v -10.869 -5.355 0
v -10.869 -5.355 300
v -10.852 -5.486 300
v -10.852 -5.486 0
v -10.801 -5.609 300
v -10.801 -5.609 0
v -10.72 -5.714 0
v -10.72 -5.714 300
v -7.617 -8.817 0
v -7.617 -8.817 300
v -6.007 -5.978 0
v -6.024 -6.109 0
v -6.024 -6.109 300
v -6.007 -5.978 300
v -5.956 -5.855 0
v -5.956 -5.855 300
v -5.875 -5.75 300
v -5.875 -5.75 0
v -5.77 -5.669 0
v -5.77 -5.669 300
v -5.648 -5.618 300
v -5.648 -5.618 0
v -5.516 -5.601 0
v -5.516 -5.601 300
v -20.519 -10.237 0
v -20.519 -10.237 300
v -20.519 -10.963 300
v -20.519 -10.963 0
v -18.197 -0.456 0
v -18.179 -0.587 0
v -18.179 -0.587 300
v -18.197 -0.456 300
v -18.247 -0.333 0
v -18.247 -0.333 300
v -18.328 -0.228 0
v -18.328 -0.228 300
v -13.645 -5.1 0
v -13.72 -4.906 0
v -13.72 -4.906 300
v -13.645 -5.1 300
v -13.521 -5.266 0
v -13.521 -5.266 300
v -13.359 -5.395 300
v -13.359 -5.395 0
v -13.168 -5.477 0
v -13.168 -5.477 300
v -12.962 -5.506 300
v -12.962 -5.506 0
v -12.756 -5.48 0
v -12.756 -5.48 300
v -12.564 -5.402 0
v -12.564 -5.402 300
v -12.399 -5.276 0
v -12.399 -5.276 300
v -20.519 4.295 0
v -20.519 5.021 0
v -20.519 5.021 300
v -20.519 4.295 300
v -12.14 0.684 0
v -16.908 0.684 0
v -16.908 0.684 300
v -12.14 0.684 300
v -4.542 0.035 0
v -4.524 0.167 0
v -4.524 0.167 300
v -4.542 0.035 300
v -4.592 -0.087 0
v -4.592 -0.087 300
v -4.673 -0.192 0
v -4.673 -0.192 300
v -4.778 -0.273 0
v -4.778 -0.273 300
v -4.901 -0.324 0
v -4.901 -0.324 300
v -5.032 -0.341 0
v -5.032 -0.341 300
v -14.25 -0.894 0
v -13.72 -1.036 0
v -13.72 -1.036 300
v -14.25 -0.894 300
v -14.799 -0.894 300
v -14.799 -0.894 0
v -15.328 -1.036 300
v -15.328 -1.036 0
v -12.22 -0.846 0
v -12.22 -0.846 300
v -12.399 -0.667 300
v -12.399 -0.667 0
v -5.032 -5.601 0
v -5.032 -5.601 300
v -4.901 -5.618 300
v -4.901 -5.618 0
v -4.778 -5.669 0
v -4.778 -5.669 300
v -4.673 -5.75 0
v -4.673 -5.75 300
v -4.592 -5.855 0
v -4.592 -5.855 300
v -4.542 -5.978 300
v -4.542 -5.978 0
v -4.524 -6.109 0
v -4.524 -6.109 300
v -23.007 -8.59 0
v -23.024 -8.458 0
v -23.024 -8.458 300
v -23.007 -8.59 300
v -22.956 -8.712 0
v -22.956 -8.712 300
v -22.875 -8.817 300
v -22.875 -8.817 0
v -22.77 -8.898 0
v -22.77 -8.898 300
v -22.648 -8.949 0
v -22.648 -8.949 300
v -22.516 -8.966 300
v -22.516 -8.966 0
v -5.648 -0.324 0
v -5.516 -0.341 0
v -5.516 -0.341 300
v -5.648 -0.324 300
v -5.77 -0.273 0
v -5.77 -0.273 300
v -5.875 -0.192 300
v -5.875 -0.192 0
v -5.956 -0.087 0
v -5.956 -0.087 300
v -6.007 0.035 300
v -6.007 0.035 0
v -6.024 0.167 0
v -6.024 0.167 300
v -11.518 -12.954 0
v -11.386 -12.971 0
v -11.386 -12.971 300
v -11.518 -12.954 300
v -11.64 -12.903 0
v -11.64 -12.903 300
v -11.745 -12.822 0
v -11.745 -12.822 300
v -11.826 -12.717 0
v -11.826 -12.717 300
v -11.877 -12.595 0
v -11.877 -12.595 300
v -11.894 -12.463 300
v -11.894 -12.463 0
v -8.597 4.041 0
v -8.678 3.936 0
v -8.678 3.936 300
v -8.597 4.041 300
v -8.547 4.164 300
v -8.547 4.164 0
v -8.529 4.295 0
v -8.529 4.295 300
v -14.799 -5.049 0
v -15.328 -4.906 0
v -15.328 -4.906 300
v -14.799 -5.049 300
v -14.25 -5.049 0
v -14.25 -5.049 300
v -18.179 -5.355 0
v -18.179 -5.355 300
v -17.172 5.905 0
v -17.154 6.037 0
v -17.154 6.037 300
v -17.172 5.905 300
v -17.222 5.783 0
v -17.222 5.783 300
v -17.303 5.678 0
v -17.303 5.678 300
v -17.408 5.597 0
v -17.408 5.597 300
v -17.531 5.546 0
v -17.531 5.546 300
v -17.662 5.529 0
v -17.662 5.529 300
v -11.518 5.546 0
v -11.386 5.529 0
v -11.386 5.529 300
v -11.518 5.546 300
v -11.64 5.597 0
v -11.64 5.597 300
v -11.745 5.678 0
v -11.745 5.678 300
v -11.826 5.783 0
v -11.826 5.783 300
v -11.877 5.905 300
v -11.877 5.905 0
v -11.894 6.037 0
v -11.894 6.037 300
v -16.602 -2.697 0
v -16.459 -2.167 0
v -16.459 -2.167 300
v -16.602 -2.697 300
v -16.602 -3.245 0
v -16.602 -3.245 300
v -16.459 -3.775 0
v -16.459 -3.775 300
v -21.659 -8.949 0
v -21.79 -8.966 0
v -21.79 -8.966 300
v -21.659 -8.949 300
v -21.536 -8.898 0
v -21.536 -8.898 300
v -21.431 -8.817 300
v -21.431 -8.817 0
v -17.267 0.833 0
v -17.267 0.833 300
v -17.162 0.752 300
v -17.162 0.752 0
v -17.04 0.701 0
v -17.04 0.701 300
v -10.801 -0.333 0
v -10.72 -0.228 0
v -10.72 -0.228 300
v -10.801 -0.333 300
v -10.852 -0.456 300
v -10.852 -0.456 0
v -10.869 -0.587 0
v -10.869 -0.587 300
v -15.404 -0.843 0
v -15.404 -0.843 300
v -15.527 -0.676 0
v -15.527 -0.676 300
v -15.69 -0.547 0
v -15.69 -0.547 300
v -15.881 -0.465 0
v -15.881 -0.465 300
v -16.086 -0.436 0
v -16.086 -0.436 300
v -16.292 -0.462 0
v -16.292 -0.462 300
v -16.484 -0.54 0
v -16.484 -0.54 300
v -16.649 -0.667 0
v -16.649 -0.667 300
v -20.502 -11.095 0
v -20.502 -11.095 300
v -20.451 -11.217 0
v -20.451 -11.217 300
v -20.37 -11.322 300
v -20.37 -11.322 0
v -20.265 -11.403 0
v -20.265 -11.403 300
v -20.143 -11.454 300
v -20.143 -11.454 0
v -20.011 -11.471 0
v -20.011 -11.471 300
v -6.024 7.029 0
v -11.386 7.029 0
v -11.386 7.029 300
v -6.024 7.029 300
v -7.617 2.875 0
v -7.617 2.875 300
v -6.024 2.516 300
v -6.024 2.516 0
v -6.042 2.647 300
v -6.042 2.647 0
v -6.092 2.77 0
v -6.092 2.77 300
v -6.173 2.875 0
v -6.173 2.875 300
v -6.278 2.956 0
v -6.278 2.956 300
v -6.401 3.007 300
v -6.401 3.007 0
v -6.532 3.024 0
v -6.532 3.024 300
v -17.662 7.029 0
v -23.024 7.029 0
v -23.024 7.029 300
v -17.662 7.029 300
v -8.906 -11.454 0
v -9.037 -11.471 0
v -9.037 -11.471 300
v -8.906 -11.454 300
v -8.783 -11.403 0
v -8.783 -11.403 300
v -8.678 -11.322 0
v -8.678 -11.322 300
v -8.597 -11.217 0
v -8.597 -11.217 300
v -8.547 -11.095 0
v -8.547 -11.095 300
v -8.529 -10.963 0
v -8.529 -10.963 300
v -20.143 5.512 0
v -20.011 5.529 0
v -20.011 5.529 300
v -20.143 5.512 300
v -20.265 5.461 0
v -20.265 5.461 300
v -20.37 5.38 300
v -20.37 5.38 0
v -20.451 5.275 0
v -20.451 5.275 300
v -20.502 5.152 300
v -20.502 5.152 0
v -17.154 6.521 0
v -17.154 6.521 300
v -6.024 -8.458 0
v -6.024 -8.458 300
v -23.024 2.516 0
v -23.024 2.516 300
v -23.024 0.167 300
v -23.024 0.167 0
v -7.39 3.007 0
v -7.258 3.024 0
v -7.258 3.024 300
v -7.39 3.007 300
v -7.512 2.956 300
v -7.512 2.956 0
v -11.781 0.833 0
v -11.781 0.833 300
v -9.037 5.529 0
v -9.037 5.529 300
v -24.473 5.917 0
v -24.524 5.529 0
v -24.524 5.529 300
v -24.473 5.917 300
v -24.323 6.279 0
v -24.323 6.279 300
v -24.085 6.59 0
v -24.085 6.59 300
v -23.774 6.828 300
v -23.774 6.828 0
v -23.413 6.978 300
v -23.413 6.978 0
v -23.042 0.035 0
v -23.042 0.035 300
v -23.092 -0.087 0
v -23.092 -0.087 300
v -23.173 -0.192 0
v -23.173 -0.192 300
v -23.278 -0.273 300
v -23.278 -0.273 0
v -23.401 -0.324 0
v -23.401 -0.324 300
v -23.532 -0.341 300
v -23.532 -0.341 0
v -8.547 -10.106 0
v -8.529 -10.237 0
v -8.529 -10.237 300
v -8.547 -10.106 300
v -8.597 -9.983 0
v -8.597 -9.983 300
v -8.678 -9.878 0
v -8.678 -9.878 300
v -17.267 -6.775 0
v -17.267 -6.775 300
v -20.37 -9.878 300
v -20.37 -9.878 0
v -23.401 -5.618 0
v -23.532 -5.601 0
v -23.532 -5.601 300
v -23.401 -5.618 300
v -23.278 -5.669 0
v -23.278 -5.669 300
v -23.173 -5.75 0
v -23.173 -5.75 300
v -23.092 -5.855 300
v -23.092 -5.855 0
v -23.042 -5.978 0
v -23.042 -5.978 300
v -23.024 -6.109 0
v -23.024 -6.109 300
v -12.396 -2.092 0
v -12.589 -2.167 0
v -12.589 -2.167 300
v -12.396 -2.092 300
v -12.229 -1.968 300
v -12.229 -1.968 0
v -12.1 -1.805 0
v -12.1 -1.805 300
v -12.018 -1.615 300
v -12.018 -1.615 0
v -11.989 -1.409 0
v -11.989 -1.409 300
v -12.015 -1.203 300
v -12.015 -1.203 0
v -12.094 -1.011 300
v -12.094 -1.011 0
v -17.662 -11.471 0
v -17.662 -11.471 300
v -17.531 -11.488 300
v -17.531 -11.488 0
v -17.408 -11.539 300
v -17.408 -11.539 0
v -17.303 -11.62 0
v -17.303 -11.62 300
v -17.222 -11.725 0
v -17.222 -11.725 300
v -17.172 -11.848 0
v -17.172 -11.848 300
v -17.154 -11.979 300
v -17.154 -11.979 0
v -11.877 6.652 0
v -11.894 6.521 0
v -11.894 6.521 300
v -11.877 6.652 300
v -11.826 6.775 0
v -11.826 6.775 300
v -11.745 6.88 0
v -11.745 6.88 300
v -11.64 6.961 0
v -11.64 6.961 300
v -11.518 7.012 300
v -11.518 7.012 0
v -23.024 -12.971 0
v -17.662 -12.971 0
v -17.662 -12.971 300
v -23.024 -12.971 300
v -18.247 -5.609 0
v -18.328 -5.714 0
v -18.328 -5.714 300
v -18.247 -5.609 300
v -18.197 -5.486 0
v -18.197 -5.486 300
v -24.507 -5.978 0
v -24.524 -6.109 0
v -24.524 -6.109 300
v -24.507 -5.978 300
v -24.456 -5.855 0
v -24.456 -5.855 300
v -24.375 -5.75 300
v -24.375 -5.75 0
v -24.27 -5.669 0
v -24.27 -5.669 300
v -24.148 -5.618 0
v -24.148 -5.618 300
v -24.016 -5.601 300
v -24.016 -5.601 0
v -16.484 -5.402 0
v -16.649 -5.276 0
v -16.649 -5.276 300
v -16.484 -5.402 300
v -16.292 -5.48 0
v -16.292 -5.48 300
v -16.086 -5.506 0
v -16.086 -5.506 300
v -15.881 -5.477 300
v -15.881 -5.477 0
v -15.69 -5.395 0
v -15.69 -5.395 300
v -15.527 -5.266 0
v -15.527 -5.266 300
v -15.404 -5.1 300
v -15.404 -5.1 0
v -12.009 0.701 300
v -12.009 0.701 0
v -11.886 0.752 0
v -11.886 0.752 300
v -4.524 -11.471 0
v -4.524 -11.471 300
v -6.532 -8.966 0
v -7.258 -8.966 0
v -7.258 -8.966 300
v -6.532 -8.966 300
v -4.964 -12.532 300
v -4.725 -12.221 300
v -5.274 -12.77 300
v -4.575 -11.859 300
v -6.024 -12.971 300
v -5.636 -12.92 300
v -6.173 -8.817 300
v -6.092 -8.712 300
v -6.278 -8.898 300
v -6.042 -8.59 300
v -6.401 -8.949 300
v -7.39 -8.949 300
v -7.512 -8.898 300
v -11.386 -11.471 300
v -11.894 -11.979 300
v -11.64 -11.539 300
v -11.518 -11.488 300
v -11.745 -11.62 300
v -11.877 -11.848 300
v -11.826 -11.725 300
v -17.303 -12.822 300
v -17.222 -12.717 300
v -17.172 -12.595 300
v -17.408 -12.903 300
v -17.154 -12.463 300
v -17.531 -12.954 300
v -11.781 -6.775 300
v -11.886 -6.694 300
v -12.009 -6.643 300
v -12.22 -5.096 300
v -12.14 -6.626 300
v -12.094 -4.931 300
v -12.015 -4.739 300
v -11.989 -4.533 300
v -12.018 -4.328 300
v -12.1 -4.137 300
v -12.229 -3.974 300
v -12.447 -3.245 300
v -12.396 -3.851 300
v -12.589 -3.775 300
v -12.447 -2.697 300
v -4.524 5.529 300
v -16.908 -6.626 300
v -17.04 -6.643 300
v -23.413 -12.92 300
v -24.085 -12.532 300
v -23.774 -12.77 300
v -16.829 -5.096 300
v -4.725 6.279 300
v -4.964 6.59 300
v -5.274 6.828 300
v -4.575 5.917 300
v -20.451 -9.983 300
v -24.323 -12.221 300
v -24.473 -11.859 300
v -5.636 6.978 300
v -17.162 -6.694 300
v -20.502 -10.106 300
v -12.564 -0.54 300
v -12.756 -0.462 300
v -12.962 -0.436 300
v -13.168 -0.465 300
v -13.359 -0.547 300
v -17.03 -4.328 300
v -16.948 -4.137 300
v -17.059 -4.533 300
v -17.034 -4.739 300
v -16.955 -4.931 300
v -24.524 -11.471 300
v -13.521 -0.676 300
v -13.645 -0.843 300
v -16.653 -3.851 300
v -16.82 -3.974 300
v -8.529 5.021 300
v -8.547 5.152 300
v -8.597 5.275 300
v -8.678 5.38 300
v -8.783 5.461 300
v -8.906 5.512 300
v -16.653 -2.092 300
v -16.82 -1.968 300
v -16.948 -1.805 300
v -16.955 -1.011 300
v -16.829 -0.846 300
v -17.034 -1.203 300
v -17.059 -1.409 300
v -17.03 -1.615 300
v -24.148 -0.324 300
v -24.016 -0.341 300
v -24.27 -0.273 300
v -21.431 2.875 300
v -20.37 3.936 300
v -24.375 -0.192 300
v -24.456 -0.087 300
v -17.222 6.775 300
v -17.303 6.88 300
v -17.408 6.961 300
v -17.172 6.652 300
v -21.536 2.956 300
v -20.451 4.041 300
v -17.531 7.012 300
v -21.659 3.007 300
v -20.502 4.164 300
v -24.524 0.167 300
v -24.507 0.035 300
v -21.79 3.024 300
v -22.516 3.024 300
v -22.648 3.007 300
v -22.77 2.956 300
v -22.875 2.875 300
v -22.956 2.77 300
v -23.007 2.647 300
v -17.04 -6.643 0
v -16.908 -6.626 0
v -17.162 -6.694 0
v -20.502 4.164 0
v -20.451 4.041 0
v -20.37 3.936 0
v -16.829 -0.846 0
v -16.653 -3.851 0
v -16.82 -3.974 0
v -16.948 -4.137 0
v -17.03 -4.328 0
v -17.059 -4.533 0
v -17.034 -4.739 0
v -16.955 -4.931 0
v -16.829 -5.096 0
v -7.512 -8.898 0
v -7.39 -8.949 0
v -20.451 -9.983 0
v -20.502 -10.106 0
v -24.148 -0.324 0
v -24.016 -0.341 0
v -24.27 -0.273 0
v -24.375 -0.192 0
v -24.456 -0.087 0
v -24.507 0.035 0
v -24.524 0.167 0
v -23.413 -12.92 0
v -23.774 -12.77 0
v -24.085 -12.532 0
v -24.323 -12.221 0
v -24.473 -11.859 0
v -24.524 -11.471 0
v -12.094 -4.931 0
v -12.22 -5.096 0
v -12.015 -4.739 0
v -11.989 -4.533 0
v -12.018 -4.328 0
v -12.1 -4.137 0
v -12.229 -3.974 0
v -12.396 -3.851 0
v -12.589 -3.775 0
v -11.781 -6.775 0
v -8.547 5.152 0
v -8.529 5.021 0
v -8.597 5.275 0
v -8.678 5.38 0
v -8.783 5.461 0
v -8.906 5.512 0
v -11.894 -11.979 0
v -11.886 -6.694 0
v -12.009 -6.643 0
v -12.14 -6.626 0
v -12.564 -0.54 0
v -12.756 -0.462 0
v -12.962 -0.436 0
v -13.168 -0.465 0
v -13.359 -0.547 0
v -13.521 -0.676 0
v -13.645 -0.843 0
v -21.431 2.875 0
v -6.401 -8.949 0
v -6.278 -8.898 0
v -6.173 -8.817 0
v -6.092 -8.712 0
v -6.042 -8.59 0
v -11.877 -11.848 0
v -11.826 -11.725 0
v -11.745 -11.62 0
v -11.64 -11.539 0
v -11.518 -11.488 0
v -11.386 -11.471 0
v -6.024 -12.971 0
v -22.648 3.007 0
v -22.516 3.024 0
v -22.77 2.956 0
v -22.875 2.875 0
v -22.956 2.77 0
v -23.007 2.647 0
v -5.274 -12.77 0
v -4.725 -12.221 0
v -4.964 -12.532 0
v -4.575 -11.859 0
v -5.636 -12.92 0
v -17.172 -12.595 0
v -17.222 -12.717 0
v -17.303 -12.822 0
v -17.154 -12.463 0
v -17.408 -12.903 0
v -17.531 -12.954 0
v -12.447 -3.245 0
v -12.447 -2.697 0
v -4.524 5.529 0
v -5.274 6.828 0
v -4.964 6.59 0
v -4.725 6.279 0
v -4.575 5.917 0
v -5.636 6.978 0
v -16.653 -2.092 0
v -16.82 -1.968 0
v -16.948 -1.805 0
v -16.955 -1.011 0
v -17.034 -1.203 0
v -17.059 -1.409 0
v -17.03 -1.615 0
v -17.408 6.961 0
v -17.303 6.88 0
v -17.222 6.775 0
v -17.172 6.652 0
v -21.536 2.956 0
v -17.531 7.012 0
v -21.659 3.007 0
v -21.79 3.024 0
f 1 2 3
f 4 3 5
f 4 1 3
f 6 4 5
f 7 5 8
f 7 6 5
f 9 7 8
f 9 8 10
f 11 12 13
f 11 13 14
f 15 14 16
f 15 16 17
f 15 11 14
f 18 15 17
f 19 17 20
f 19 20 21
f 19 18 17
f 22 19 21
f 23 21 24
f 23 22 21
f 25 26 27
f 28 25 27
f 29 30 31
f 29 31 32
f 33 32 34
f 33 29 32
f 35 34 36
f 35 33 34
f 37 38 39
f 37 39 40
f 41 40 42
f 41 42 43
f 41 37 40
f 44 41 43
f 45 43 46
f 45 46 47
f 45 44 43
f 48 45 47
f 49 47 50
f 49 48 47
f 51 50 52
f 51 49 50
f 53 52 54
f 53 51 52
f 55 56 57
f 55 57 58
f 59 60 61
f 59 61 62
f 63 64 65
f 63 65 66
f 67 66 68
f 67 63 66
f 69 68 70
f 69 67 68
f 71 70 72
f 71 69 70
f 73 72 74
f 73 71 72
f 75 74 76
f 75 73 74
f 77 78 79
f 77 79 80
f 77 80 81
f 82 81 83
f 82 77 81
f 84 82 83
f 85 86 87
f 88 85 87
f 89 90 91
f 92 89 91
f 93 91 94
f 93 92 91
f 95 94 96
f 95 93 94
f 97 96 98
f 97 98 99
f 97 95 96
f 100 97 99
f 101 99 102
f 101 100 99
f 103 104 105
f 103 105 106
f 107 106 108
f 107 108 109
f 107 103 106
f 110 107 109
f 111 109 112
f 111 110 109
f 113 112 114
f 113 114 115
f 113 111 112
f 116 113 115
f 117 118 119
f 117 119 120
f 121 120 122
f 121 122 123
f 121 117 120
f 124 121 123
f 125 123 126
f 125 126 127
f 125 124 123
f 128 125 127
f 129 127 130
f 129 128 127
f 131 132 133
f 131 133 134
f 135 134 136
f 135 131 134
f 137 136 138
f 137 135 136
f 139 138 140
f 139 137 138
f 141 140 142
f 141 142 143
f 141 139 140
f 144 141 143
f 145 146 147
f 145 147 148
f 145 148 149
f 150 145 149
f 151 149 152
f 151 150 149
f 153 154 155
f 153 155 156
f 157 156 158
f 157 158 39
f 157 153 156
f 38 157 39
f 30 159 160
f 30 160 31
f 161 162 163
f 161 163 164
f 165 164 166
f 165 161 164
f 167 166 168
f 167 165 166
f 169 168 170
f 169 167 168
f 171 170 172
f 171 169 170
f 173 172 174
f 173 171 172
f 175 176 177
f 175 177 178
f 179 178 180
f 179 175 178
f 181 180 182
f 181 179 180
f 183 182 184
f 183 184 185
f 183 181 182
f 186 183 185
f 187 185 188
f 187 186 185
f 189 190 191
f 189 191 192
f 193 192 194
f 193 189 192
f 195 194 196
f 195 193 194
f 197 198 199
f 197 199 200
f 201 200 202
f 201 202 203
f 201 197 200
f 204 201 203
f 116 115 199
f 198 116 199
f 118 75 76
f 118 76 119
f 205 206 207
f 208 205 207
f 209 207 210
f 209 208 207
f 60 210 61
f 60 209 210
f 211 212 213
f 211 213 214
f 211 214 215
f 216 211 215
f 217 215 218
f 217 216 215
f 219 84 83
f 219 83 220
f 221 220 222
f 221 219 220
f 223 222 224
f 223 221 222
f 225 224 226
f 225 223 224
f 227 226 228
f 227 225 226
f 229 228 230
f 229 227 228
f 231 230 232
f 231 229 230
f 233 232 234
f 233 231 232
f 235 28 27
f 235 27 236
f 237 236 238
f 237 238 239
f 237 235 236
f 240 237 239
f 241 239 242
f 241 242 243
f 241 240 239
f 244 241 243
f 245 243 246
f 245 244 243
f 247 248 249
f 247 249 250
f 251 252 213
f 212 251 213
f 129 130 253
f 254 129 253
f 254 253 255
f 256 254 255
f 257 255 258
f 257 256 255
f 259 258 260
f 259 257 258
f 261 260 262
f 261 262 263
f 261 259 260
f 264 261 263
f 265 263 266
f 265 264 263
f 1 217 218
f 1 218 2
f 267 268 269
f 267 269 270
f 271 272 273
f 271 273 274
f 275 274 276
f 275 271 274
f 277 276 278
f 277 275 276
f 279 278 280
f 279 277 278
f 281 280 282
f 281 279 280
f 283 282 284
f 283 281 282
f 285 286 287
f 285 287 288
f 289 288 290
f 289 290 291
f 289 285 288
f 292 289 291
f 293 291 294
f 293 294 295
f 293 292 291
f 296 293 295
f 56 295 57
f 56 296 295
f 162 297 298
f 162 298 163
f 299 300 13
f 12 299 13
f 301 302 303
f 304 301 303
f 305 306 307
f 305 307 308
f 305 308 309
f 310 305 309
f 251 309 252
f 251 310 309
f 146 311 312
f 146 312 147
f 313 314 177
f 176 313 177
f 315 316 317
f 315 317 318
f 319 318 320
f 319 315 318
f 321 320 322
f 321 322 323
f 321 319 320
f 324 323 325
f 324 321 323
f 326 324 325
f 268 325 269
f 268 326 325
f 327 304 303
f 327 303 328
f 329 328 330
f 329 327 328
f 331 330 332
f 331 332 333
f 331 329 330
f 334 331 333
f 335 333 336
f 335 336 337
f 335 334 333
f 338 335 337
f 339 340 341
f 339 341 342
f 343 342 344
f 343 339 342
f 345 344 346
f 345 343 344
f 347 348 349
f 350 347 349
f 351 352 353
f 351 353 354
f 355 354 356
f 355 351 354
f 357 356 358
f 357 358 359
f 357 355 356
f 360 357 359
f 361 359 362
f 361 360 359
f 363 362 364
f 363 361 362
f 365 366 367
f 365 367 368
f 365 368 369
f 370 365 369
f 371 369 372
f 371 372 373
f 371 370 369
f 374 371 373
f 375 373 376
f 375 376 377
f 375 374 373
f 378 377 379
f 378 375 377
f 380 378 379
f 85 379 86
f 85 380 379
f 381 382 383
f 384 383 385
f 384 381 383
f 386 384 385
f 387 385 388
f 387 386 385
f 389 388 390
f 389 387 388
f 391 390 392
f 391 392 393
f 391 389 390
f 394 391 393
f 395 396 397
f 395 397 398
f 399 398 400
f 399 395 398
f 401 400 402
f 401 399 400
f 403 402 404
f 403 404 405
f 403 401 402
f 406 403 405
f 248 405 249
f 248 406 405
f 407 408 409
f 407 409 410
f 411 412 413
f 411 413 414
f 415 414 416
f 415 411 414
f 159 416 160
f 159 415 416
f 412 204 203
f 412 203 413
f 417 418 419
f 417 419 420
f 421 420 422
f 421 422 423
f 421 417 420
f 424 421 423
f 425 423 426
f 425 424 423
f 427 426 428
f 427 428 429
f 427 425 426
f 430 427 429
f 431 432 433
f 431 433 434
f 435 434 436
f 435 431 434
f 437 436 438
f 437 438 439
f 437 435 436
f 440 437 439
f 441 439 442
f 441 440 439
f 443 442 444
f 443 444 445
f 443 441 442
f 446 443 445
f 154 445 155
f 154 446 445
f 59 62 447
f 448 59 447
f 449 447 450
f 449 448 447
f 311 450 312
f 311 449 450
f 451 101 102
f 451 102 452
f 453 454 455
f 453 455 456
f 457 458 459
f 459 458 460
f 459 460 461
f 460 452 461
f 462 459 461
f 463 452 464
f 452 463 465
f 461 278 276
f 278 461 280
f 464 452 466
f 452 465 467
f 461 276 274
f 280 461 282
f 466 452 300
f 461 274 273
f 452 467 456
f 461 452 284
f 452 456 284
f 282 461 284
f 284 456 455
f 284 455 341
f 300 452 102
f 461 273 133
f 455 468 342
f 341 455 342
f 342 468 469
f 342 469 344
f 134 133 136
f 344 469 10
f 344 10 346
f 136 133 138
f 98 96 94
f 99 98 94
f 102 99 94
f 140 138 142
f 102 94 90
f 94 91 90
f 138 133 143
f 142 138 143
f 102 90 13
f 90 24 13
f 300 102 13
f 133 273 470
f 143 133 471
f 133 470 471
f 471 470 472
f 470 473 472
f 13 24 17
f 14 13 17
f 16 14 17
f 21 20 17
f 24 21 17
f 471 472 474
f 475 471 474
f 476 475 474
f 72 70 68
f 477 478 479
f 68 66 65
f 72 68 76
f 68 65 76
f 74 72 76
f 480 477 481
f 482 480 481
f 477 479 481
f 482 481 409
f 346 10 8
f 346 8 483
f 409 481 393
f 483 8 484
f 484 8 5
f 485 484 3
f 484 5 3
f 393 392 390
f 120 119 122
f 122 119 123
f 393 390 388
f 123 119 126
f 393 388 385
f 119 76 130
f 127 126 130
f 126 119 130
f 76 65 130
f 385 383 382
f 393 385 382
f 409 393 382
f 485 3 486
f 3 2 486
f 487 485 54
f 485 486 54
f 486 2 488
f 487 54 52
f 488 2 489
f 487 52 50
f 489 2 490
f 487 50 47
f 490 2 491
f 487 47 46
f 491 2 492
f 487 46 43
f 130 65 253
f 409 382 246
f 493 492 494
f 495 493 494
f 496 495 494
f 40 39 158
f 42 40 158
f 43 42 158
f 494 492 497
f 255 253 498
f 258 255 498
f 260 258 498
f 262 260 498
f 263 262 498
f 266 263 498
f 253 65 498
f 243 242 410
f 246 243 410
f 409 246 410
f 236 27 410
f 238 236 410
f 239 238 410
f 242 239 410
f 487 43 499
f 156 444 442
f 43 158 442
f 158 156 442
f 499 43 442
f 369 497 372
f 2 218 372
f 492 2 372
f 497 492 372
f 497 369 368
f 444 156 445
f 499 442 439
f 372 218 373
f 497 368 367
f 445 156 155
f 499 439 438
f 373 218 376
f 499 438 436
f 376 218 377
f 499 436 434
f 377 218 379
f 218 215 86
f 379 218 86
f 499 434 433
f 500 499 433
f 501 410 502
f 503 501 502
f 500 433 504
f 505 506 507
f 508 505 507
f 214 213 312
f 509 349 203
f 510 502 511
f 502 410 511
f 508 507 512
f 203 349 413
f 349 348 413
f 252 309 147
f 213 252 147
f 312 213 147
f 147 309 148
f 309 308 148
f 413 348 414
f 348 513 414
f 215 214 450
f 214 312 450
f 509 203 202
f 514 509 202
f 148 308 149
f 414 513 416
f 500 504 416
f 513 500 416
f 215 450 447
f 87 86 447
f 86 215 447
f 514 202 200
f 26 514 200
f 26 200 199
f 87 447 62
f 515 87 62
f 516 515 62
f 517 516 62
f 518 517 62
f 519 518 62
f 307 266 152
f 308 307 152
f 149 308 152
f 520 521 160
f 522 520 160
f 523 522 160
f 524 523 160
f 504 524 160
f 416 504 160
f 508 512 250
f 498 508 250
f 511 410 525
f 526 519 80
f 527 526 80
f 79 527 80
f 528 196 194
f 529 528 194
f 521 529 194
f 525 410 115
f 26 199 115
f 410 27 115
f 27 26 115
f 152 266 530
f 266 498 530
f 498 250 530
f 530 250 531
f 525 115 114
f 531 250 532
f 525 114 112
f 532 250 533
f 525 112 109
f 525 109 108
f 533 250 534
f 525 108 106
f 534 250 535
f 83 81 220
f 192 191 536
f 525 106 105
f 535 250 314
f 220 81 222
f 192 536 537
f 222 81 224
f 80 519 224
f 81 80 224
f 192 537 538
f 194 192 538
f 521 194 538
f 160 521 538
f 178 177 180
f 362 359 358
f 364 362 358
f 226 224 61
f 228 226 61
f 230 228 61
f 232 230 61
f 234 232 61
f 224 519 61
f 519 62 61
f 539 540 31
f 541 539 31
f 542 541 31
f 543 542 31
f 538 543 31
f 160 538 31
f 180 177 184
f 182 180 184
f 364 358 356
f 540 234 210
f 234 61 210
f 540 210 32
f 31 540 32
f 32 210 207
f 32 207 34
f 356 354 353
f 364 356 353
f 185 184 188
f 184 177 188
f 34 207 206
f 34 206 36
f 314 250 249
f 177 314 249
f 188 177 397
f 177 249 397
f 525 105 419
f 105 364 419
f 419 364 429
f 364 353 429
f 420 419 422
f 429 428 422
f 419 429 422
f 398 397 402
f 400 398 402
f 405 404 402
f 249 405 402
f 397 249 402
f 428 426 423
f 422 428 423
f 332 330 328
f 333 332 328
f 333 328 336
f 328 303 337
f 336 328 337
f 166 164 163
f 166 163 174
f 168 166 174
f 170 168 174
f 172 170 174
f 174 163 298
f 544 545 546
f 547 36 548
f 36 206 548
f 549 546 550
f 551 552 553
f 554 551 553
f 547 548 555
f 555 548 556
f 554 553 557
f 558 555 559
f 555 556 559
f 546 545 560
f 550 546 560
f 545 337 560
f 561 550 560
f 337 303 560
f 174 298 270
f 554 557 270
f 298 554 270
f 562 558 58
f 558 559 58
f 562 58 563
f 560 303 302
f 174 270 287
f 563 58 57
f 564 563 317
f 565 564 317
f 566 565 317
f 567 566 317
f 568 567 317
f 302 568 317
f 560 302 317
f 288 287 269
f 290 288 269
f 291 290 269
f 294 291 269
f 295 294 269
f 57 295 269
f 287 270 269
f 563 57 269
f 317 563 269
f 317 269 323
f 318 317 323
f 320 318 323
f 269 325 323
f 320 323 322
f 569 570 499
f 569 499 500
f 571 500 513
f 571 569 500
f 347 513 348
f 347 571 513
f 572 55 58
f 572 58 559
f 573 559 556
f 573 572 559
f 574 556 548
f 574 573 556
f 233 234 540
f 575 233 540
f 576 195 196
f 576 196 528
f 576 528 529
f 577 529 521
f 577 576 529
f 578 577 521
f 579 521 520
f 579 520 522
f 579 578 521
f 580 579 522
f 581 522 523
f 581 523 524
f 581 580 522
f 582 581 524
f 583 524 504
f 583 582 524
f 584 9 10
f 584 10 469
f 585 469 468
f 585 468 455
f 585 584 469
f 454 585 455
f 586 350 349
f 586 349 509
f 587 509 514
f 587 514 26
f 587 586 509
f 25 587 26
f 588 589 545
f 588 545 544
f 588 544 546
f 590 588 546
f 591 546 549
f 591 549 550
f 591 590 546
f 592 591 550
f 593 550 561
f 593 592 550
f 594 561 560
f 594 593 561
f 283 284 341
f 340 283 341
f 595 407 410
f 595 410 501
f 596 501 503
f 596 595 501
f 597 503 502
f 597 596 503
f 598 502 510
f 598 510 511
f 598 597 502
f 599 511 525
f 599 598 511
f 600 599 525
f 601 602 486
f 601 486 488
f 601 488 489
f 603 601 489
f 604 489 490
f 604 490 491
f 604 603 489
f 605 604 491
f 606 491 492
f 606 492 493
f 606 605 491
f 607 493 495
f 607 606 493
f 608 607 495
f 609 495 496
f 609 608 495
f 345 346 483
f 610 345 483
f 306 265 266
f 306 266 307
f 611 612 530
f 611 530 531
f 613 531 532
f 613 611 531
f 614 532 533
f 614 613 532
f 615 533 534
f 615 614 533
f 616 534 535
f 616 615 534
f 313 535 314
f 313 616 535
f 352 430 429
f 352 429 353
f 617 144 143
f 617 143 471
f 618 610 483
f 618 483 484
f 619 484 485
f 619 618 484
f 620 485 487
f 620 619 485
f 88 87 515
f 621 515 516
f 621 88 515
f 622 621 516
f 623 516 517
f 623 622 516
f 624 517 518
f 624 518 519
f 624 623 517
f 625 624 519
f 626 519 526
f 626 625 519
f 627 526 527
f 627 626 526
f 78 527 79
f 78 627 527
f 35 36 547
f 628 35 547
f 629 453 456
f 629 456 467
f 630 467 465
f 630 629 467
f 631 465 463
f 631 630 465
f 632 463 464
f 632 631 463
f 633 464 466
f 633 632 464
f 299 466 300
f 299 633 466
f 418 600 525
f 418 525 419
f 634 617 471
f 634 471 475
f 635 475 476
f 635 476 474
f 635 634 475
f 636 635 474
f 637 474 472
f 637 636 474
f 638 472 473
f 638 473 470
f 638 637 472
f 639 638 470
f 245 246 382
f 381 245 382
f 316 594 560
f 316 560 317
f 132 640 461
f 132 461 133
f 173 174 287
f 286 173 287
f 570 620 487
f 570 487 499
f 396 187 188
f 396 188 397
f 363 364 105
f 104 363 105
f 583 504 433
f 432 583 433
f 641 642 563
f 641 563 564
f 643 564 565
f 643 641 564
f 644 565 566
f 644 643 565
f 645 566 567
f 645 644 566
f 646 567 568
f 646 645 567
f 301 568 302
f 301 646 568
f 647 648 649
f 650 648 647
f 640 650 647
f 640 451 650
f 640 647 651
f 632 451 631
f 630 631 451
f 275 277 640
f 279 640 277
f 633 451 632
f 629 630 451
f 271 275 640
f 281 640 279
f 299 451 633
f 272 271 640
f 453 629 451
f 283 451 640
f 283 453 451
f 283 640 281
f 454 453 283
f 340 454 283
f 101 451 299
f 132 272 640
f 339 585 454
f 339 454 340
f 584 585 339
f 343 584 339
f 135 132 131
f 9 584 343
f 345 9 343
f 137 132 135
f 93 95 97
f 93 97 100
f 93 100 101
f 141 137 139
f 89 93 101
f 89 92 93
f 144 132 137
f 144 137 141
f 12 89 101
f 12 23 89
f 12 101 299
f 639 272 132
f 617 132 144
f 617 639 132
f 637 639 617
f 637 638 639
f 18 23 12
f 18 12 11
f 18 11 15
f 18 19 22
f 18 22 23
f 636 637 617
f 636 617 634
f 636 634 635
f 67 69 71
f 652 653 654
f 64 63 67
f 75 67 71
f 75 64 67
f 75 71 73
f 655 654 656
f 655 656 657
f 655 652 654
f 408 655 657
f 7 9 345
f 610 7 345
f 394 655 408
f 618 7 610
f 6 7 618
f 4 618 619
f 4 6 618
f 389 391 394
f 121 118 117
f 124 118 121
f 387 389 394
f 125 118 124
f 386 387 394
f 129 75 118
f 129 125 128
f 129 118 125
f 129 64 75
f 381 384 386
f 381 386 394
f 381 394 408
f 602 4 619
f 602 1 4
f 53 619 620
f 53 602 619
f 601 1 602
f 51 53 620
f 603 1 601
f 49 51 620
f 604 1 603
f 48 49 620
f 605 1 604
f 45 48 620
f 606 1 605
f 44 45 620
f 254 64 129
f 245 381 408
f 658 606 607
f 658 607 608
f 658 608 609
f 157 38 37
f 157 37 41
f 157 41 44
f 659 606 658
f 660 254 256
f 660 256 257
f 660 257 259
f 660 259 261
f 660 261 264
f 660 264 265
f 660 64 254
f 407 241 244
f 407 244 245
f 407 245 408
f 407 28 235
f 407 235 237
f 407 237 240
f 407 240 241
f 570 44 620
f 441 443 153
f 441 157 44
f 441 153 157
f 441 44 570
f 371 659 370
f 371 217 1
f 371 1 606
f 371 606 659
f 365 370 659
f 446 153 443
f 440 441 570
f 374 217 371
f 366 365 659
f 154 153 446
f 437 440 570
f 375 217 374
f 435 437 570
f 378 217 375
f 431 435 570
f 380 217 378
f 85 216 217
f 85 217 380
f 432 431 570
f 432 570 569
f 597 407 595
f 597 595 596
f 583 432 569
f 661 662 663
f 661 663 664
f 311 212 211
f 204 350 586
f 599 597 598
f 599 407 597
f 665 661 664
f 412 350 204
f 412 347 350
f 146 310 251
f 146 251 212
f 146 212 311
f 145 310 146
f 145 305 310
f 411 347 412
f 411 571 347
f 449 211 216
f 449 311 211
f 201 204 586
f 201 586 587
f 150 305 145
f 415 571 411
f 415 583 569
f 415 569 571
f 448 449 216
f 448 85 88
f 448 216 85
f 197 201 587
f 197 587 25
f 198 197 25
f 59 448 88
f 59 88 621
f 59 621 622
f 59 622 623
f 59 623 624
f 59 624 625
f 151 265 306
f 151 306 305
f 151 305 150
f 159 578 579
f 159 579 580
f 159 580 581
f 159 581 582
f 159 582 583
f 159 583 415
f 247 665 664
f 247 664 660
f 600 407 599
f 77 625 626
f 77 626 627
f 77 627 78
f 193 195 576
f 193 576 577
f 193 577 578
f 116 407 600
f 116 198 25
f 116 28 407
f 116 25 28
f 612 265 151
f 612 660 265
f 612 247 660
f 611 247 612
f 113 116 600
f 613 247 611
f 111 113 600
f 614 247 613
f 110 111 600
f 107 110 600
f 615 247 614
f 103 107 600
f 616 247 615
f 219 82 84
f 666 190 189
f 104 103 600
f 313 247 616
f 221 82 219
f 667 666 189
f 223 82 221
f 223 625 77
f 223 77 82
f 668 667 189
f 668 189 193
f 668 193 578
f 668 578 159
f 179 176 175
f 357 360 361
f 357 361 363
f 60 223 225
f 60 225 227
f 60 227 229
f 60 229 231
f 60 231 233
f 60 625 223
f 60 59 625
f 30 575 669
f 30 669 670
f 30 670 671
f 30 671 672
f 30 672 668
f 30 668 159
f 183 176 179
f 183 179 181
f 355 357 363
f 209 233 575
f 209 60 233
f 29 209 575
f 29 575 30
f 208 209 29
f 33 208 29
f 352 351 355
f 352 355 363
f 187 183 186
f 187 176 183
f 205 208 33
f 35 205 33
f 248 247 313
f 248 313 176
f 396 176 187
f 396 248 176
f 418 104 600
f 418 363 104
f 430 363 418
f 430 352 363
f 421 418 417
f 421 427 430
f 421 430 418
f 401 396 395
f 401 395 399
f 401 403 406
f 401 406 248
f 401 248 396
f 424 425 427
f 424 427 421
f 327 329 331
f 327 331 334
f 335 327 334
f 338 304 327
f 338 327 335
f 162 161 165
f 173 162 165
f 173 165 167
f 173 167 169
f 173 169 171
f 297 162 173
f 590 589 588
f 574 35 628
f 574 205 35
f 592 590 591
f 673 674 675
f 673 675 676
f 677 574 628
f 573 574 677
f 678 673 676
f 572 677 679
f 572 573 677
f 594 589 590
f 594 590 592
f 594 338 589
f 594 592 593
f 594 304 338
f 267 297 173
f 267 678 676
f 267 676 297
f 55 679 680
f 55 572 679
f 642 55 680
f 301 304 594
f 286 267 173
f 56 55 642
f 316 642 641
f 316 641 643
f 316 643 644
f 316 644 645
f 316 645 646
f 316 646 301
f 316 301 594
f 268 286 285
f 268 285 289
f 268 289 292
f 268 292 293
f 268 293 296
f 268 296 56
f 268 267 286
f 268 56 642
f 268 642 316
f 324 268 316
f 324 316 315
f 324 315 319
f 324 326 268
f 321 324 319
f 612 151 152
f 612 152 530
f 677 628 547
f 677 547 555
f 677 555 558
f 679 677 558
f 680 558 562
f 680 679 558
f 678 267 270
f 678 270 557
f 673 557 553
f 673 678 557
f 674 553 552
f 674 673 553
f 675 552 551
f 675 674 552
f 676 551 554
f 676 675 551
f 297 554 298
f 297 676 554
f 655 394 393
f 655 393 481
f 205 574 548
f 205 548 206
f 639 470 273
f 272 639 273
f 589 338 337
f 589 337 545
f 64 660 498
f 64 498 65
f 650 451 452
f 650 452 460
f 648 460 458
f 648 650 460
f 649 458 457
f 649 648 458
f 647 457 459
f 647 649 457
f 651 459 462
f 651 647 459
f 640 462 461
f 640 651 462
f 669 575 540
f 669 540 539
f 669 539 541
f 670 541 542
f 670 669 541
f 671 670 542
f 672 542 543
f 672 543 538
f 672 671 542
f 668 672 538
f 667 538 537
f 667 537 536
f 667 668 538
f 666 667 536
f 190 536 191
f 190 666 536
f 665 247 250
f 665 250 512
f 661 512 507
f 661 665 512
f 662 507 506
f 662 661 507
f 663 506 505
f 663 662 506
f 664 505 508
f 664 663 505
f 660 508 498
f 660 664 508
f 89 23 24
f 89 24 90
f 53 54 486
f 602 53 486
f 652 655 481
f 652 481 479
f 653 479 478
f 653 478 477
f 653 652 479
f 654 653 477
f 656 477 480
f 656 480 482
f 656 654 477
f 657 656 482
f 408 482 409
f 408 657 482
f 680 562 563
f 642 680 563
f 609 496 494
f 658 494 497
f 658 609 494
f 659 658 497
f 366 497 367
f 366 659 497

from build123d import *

# Parameters (mm, degrees)
EXTRUDE1_DEPTH = 300


with BuildPart() as part:
    # Sketch1 → Extrude1 (new body)
    with BuildSketch(Plane.XY):
        with BuildLine():
            Line((-5.032287798, -0.341059771), (-5.516287798, -0.341059771))
            ThreePointArc((-5.516287798, -0.341059771), (-5.875498042, -0.192270016), (-6.024287798, 0.166940229))
            Line((-6.024287798, 0.166940229), (-6.024287798, 2.515940229))
            ThreePointArc((-6.024287798, 2.515940229), (-6.173077553, 2.875150474), (-6.532287798, 3.023940229))
            Line((-6.532287798, 3.023940229), (-7.258207136, 3.023940229))
            ThreePointArc((-7.258207136, 3.023940229), (-7.45261032, 2.985271032), (-7.617417381, 2.875150474))
            Line((-7.617417381, 2.875150474), (-10.720498042, -0.227930187))
            ThreePointArc((-10.720498042, -0.227930187), (-10.8306186, -0.392737249), (-10.869287798, -0.587140432))
            Line((-10.869287798, -0.587140432), (-10.869287798, -5.354979109))
            ThreePointArc((-10.869287798, -5.354979109), (-10.8306186, -5.549382293), (-10.720498042, -5.714189354))
            Line((-10.720498042, -5.714189354), (-7.617417381, -8.817270016))
            ThreePointArc((-7.617417381, -8.817270016), (-7.45261032, -8.927390573), (-7.258207136, -8.966059771))
            Line((-7.258207136, -8.966059771), (-6.532287798, -8.966059771))
            ThreePointArc((-6.532287798, -8.966059771), (-6.173077553, -8.817270016), (-6.024287798, -8.458059771))
            Line((-6.024287798, -8.458059771), (-6.024287798, -6.109059771))
            ThreePointArc((-6.024287798, -6.109059771), (-5.875498042, -5.749849526), (-5.516287798, -5.601059771))
            Line((-5.516287798, -5.601059771), (-5.032287798, -5.601059771))
            ThreePointArc((-5.032287798, -5.601059771), (-4.673077553, -5.749849526), (-4.524287798, -6.109059771))
            Line((-4.524287798, -6.109059771), (-4.524287798, -11.471059771))
            ThreePointArc((-4.524287798, -11.471059771), (-4.963627626, -12.531719943), (-6.024287798, -12.971059771))
            Line((-6.024287798, -12.971059771), (-11.386287798, -12.971059771))
            ThreePointArc((-11.386287798, -12.971059771), (-11.745498042, -12.822270016), (-11.894287798, -12.463059771))
            Line((-11.894287798, -12.463059771), (-11.894287798, -11.979059771))
            ThreePointArc((-11.894287798, -11.979059771), (-11.745498042, -11.619849526), (-11.386287798, -11.471059771))
            Line((-11.386287798, -11.471059771), (-9.037287798, -11.471059771))
            ThreePointArc((-9.037287798, -11.471059771), (-8.678077553, -11.322270016), (-8.529287798, -10.963059771))
            Line((-8.529287798, -10.963059771), (-8.529287798, -10.237140432))
            ThreePointArc((-8.529287798, -10.237140432), (-8.567956995, -10.042737249), (-8.678077553, -9.877930187))
            Line((-8.678077553, -9.877930187), (-11.781158214, -6.774849526))
            ThreePointArc((-11.781158214, -6.774849526), (-11.945965275, -6.664728968), (-12.140368459, -6.626059771))
            Line((-12.140368459, -6.626059771), (-16.908207136, -6.626059771))
            ThreePointArc((-16.908207136, -6.626059771), (-17.10261032, -6.664728968), (-17.267417381, -6.774849526))
            Line((-17.267417381, -6.774849526), (-20.370498042, -9.877930187))
            ThreePointArc((-20.370498042, -9.877930187), (-20.4806186, -10.042737249), (-20.519287798, -10.237140432))
            Line((-20.519287798, -10.237140432), (-20.519287798, -10.963059771))
            ThreePointArc((-20.519287798, -10.963059771), (-20.370498042, -11.322270016), (-20.011287798, -11.471059771))
            Line((-20.011287798, -11.471059771), (-17.662287798, -11.471059771))
            ThreePointArc((-17.662287798, -11.471059771), (-17.303077553, -11.619849526), (-17.154287798, -11.979059771))
            Line((-17.154287798, -11.979059771), (-17.154287798, -12.463059771))
            ThreePointArc((-17.154287798, -12.463059771), (-17.303077553, -12.822270016), (-17.662287798, -12.971059771))
            Line((-17.662287798, -12.971059771), (-23.024287798, -12.971059771))
            ThreePointArc((-23.024287798, -12.971059771), (-24.084947969, -12.531719943), (-24.524287798, -11.471059771))
            Line((-24.524287798, -11.471059771), (-24.524287798, -6.109059771))
            ThreePointArc((-24.524287798, -6.109059771), (-24.375498042, -5.749849526), (-24.016287798, -5.601059771))
            Line((-24.016287798, -5.601059771), (-23.532287798, -5.601059771))
            ThreePointArc((-23.532287798, -5.601059771), (-23.173077553, -5.749849526), (-23.024287798, -6.109059771))
            Line((-23.024287798, -6.109059771), (-23.024287798, -8.458059771))
            ThreePointArc((-23.024287798, -8.458059771), (-22.875498042, -8.817270016), (-22.516287798, -8.966059771))
            Line((-22.516287798, -8.966059771), (-21.790368459, -8.966059771))
            ThreePointArc((-21.790368459, -8.966059771), (-21.595965275, -8.927390573), (-21.431158214, -8.817270016))
            Line((-21.431158214, -8.817270016), (-18.328077553, -5.714189354))
            ThreePointArc((-18.328077553, -5.714189354), (-18.217956995, -5.549382293), (-18.179287798, -5.354979109))
            Line((-18.179287798, -5.354979109), (-18.179287798, -0.587140432))
            ThreePointArc((-18.179287798, -0.587140432), (-18.217956995, -0.392737249), (-18.328077553, -0.227930187))
            Line((-18.328077553, -0.227930187), (-21.431158214, 2.875150474))
            ThreePointArc((-21.431158214, 2.875150474), (-21.595965275, 2.985271032), (-21.790368459, 3.023940229))
            Line((-21.790368459, 3.023940229), (-22.516287798, 3.023940229))
            ThreePointArc((-22.516287798, 3.023940229), (-22.875498042, 2.875150474), (-23.024287798, 2.515940229))
            Line((-23.024287798, 2.515940229), (-23.024287798, 0.166940229))
            ThreePointArc((-23.024287798, 0.166940229), (-23.173077553, -0.192270016), (-23.532287798, -0.341059771))
            Line((-23.532287798, -0.341059771), (-24.016287798, -0.341059771))
            ThreePointArc((-24.016287798, -0.341059771), (-24.375498042, -0.192270016), (-24.524287798, 0.166940229))
            Line((-24.524287798, 0.166940229), (-24.524287798, 5.528940229))
            ThreePointArc((-24.524287798, 5.528940229), (-24.084947969, 6.589600401), (-23.024287798, 7.028940229))
            Line((-23.024287798, 7.028940229), (-17.662287798, 7.028940229))
            ThreePointArc((-17.662287798, 7.028940229), (-17.303077553, 6.880150474), (-17.154287798, 6.520940229))
            Line((-17.154287798, 6.520940229), (-17.154287798, 6.036940229))
            ThreePointArc((-17.154287798, 6.036940229), (-17.303077553, 5.677729984), (-17.662287798, 5.528940229))
            Line((-17.662287798, 5.528940229), (-20.011287798, 5.528940229))
            ThreePointArc((-20.011287798, 5.528940229), (-20.370498042, 5.380150474), (-20.519287798, 5.020940229))
            Line((-20.519287798, 5.020940229), (-20.519287798, 4.295020891))
            ThreePointArc((-20.519287798, 4.295020891), (-20.4806186, 4.100617707), (-20.370498042, 3.935810646))
            Line((-20.370498042, 3.935810646), (-17.267417381, 0.832729984))
            ThreePointArc((-17.267417381, 0.832729984), (-17.10261032, 0.722609427), (-16.908207136, 0.683940229))
            Line((-16.908207136, 0.683940229), (-12.140368459, 0.683940229))
            ThreePointArc((-12.140368459, 0.683940229), (-11.945965275, 0.722609427), (-11.781158214, 0.832729984))
            Line((-11.781158214, 0.832729984), (-8.678077553, 3.935810646))
            ThreePointArc((-8.678077553, 3.935810646), (-8.567956995, 4.100617707), (-8.529287798, 4.295020891))
            Line((-8.529287798, 4.295020891), (-8.529287798, 5.020940229))
            ThreePointArc((-8.529287798, 5.020940229), (-8.678077553, 5.380150474), (-9.037287798, 5.528940229))
            Line((-9.037287798, 5.528940229), (-11.386287798, 5.528940229))
            ThreePointArc((-11.386287798, 5.528940229), (-11.745498042, 5.677729984), (-11.894287798, 6.036940229))
            Line((-11.894287798, 6.036940229), (-11.894287798, 6.520940229))
            ThreePointArc((-11.894287798, 6.520940229), (-11.745498042, 6.880150474), (-11.386287798, 7.028940229))
            Line((-11.386287798, 7.028940229), (-6.024287798, 7.028940229))
            ThreePointArc((-6.024287798, 7.028940229), (-4.963627626, 6.589600401), (-4.524287798, 5.528940229))
            Line((-4.524287798, 5.528940229), (-4.524287798, 0.166940229))
            ThreePointArc((-4.524287798, 0.166940229), (-4.673077553, -0.192270016), (-5.032287798, -0.341059771))
        make_face()
        with BuildLine():
            Line((-12.399386954, -5.275565737), (-12.219781831, -5.095960615))
            ThreePointArc((-12.219781831, -5.095960615), (-12.018349781, -4.327527582), (-12.589154291, -3.775036489))
            ThreePointArc((-12.589154291, -3.775036489), (-12.428787798, -2.971059771), (-12.589154291, -2.167083053))
            ThreePointArc((-12.589154291, -2.167083053), (-12.018349781, -1.61459196), (-12.219781831, -0.846158927))
            Line((-12.219781831, -0.846158927), (-12.399386954, -0.666553805))
            ThreePointArc((-12.399386954, -0.666553805), (-13.167819987, -0.465121754), (-13.72031108, -1.035926265))
            ThreePointArc((-13.72031108, -1.035926265), (-14.524287798, -0.875559771), (-15.328264516, -1.035926265))
            ThreePointArc((-15.328264516, -1.035926265), (-15.880755608, -0.465121754), (-16.649188641, -0.666553805))
            Line((-16.649188641, -0.666553805), (-16.828793764, -0.846158927))
            ThreePointArc((-16.828793764, -0.846158927), (-17.030225814, -1.61459196), (-16.459421304, -2.167083053))
            ThreePointArc((-16.459421304, -2.167083053), (-16.619787798, -2.971059771), (-16.459421304, -3.775036489))
            ThreePointArc((-16.459421304, -3.775036489), (-17.030225814, -4.327527582), (-16.828793764, -5.095960615))
            Line((-16.828793764, -5.095960615), (-16.649188641, -5.275565737))
            ThreePointArc((-16.649188641, -5.275565737), (-15.880755608, -5.476997788), (-15.328264516, -4.906193277))
            ThreePointArc((-15.328264516, -4.906193277), (-14.524287798, -5.066559771), (-13.72031108, -4.906193277))
            ThreePointArc((-13.72031108, -4.906193277), (-13.167819987, -5.476997788), (-12.399386954, -5.275565737))
        make_face(mode=Mode.SUBTRACT)
    extrude(amount=EXTRUDE1_DEPTH)


solid = part.part
